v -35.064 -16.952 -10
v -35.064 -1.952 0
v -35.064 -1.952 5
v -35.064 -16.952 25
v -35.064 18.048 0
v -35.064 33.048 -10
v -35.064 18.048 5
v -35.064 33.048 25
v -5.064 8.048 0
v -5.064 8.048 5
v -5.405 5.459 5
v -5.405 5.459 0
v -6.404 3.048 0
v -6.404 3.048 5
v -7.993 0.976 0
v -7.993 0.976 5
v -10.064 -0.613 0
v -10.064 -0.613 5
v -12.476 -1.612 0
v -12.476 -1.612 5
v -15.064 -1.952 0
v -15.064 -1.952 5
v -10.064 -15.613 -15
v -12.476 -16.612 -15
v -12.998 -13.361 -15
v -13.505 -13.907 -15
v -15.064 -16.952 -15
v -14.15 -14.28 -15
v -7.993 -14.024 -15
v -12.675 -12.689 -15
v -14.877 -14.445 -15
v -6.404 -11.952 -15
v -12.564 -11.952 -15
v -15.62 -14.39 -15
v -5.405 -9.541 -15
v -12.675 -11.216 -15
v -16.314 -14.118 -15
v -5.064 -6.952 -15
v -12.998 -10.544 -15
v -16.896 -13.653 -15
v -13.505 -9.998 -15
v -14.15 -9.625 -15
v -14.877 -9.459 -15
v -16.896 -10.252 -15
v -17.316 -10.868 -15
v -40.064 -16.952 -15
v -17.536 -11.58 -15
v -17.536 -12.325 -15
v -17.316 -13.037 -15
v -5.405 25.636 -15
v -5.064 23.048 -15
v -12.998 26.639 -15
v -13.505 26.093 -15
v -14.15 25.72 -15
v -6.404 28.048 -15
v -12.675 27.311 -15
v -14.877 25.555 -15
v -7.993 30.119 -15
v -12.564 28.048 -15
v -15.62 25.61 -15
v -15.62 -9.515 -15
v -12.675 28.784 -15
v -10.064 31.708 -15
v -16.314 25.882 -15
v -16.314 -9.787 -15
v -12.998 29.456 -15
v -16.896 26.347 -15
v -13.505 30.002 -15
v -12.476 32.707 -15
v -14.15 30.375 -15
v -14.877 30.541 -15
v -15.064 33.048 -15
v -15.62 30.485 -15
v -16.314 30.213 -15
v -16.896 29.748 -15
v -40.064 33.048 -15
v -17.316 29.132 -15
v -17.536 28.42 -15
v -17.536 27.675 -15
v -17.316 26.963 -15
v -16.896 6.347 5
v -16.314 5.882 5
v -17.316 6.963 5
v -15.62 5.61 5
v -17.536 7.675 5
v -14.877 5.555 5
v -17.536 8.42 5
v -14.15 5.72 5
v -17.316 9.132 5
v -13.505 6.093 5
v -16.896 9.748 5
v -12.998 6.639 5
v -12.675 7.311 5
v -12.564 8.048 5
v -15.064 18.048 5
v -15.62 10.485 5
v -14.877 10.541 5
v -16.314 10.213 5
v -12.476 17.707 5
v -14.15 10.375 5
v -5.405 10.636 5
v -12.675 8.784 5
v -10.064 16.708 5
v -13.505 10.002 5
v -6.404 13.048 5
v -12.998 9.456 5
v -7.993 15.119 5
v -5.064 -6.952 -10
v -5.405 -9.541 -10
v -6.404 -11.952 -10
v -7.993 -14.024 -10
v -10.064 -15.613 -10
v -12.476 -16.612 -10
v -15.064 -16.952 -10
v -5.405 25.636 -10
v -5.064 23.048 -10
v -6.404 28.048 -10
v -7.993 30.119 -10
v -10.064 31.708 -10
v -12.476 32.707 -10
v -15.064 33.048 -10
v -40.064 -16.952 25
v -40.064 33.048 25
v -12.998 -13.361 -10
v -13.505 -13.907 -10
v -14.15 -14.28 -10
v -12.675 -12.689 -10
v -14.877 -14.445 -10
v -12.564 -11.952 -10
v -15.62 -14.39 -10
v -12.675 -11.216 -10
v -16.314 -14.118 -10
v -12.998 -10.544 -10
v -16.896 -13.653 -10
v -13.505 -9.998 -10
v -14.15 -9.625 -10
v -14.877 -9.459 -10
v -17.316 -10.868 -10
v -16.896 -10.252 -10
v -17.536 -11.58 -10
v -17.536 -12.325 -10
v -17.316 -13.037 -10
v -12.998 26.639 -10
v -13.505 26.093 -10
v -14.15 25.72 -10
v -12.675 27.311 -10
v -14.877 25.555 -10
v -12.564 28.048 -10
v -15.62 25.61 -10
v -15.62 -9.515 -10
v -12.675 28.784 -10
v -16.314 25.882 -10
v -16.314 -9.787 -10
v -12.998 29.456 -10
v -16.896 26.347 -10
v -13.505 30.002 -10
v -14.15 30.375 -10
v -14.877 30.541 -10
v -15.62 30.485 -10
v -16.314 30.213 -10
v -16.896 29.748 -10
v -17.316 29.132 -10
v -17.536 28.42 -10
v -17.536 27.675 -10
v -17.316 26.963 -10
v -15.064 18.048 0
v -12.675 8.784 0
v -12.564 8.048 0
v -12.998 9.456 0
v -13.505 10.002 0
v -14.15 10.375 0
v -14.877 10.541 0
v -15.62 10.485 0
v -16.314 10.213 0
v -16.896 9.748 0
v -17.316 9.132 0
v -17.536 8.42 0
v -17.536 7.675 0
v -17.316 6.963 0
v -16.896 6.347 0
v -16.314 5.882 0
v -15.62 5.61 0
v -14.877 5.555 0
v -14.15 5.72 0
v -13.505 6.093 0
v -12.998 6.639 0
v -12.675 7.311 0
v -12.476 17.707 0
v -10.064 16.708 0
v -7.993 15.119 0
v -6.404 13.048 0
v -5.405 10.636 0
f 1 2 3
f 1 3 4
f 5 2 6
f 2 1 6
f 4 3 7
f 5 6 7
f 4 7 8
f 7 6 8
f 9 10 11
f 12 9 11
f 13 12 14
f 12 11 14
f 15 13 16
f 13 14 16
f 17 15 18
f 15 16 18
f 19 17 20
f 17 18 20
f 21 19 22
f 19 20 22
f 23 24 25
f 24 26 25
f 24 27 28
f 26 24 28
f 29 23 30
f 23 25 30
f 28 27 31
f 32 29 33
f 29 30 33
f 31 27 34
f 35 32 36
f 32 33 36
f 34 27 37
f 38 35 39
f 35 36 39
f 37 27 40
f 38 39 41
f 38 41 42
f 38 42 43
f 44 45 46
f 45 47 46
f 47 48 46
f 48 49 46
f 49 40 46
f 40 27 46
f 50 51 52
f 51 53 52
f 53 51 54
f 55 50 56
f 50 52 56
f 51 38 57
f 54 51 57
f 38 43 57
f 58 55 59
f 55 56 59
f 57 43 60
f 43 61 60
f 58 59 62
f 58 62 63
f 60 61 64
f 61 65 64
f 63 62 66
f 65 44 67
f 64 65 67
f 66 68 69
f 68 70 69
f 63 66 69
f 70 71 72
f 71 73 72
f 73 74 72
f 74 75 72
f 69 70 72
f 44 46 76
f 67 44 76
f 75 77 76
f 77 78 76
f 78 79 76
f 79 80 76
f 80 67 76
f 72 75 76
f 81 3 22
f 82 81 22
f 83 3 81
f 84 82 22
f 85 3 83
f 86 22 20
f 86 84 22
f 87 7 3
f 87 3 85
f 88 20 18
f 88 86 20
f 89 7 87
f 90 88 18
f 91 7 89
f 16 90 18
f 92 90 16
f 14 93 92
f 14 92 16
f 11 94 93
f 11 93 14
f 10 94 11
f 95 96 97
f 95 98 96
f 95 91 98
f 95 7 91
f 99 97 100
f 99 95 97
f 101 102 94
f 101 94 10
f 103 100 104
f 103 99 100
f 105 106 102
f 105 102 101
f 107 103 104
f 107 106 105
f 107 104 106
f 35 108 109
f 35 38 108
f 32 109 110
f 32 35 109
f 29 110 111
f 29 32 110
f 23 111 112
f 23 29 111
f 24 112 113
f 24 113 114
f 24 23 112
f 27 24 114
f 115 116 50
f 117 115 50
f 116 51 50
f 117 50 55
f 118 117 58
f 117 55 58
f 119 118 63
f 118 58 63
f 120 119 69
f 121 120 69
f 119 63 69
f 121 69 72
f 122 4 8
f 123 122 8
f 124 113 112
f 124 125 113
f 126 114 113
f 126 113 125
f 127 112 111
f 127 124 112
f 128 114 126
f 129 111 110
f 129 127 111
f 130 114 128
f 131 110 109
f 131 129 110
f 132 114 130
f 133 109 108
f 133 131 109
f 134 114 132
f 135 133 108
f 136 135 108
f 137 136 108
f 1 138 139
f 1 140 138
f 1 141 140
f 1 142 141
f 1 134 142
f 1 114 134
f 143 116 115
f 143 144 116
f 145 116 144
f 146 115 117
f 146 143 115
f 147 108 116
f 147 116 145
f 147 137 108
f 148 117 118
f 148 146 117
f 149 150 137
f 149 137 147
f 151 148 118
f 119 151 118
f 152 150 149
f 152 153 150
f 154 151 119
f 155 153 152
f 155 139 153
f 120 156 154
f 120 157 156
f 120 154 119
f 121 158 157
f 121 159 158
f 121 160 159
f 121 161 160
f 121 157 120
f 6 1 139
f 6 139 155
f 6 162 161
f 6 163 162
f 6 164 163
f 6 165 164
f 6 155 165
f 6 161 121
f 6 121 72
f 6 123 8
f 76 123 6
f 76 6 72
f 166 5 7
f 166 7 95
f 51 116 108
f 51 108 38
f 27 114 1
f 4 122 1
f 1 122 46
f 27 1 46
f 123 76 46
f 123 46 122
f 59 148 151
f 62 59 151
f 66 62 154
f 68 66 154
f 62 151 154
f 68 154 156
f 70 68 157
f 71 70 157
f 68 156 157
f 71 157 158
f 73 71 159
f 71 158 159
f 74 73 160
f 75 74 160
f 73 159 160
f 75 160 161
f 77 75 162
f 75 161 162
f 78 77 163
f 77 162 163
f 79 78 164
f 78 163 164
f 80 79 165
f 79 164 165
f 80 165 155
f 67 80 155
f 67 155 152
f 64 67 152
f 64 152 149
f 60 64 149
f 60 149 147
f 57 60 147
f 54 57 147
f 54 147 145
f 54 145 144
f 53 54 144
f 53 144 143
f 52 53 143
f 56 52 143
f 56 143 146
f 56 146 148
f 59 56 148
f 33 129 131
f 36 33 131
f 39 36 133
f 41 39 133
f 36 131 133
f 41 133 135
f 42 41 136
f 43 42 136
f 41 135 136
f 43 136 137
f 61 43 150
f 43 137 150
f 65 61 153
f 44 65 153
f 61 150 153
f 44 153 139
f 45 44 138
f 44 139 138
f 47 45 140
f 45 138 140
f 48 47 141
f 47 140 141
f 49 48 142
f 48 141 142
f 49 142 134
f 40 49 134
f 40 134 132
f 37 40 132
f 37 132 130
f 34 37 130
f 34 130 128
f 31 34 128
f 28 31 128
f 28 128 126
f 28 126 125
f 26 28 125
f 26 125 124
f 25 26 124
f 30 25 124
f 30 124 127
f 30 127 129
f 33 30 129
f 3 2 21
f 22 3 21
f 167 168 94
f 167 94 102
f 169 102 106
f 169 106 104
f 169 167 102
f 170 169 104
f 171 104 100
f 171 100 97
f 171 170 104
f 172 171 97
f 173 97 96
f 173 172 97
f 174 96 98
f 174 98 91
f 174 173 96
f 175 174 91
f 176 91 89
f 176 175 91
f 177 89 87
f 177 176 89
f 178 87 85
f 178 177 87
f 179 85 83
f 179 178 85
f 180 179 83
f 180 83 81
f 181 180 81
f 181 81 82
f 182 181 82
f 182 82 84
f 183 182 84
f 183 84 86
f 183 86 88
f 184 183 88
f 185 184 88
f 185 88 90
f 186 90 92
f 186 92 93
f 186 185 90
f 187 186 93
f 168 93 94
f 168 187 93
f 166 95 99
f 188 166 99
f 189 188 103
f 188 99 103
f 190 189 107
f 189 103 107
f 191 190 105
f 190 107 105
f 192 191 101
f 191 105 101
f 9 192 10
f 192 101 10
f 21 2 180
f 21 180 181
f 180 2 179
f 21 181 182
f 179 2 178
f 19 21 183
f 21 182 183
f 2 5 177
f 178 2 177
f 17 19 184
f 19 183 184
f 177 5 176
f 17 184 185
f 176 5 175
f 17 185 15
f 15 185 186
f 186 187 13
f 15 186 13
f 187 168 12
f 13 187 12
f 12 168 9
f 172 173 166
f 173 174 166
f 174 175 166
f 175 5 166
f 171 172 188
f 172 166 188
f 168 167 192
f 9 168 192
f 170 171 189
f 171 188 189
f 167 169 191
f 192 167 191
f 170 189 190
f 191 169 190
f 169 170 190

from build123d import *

# Parameters (mm, degrees)
SKETCH1_R           = 2.5
BOSS_EXTRUDE1_DEPTH = 5
CUT_EXTRUDE1_DEPTH  = 5
SKETCH3_W           = 40
SKETCH3_H           = 50
BOSS_EXTRUDE2_DEPTH = 5
SKETCH4_W           = 5
SKETCH4_H           = 50
BOSS_EXTRUDE3_DEPTH = 30
SKETCH5_R           = 2.5
CUT_EXTRUDE2_DEPTH  = 20
FILLET1_R           = 10
FILLET2_R           = 10


with BuildPart() as part:
    # Sketch1 → Boss-Extrude1 (new body)
    with BuildSketch(Plane.XY):
        Polygon((-5.063803349, -1.952454159), (-5.063803349, 8.047545841), (-5.063803349, 18.047545841), (-35.063803349, 18.047545841), (-35.063803349, -1.952454159), align=None)
        with Locations((-15.063803349, 8.047545841)):
            Circle(SKETCH1_R, mode=Mode.SUBTRACT)
    extrude(amount=BOSS_EXTRUDE1_DEPTH)

    # Sketch2 → Cut-Extrude1 (cut)
    with BuildSketch(Plane.XY.offset(5)):
        with BuildLine():
            ThreePointArc((-15.063803349, 18.047545841), (-7.992735537, 15.118613653), (-5.063803349, 8.047545841))
            Line((-5.063803349, 8.047545841), (-5.063803349, 18.047545841))
            Line((-5.063803349, 18.047545841), (-15.063803349, 18.047545841))
        make_face()
        with BuildLine():
            Line((-5.063803349, -1.952454159), (-5.063803349, 8.047545841))
            ThreePointArc((-5.063803349, 8.047545841), (-7.992735537, 0.976478029), (-15.063803349, -1.952454159))
            Line((-15.063803349, -1.952454159), (-5.063803349, -1.952454159))
        make_face()
    extrude(amount=-CUT_EXTRUDE1_DEPTH, mode=Mode.SUBTRACT)

    # Sketch3 → Boss-Extrude2 (add)
    with BuildSketch(Plane.ZY.offset(35.063803349)):
        with Locations((5, 8.047545841)):
            Rectangle(SKETCH3_W, SKETCH3_H)
    extrude(amount=BOSS_EXTRUDE2_DEPTH)

    # Sketch4 → Boss-Extrude3 (add)
    with BuildSketch(Plane(origin=(-35.063803349, 0, 0), x_dir=(0, 0, -1), z_dir=(1, 0, 0))):
        with Locations((12.5, 8.047545841)):
            Rectangle(SKETCH4_W, SKETCH4_H)
    extrude(amount=BOSS_EXTRUDE3_DEPTH)

    # Sketch5 → Cut-Extrude2 (cut)
    with BuildSketch(Plane.XY.offset(-10)):
        with Locations((-15.063803349, 28.047545841)):
            Circle(SKETCH5_R)
        with Locations((-15.063803349, -11.952454159)):
            Circle(SKETCH5_R)
    extrude(amount=-CUT_EXTRUDE2_DEPTH, mode=Mode.SUBTRACT)

    # Fillet1
    fillet1_edges = [part.edges().sort_by_distance(p)[0] for p in [
        (-5.063803349, 33.047545841, -12.5),
    ]]
    fillet(fillet1_edges, radius=FILLET1_R)

    # Fillet2
    fillet2_edges = [part.edges().sort_by_distance(p)[0] for p in [
        (-5.063803349, -16.952454159, -12.5),
    ]]
    fillet(fillet2_edges, radius=FILLET2_R)


solid = part.part
